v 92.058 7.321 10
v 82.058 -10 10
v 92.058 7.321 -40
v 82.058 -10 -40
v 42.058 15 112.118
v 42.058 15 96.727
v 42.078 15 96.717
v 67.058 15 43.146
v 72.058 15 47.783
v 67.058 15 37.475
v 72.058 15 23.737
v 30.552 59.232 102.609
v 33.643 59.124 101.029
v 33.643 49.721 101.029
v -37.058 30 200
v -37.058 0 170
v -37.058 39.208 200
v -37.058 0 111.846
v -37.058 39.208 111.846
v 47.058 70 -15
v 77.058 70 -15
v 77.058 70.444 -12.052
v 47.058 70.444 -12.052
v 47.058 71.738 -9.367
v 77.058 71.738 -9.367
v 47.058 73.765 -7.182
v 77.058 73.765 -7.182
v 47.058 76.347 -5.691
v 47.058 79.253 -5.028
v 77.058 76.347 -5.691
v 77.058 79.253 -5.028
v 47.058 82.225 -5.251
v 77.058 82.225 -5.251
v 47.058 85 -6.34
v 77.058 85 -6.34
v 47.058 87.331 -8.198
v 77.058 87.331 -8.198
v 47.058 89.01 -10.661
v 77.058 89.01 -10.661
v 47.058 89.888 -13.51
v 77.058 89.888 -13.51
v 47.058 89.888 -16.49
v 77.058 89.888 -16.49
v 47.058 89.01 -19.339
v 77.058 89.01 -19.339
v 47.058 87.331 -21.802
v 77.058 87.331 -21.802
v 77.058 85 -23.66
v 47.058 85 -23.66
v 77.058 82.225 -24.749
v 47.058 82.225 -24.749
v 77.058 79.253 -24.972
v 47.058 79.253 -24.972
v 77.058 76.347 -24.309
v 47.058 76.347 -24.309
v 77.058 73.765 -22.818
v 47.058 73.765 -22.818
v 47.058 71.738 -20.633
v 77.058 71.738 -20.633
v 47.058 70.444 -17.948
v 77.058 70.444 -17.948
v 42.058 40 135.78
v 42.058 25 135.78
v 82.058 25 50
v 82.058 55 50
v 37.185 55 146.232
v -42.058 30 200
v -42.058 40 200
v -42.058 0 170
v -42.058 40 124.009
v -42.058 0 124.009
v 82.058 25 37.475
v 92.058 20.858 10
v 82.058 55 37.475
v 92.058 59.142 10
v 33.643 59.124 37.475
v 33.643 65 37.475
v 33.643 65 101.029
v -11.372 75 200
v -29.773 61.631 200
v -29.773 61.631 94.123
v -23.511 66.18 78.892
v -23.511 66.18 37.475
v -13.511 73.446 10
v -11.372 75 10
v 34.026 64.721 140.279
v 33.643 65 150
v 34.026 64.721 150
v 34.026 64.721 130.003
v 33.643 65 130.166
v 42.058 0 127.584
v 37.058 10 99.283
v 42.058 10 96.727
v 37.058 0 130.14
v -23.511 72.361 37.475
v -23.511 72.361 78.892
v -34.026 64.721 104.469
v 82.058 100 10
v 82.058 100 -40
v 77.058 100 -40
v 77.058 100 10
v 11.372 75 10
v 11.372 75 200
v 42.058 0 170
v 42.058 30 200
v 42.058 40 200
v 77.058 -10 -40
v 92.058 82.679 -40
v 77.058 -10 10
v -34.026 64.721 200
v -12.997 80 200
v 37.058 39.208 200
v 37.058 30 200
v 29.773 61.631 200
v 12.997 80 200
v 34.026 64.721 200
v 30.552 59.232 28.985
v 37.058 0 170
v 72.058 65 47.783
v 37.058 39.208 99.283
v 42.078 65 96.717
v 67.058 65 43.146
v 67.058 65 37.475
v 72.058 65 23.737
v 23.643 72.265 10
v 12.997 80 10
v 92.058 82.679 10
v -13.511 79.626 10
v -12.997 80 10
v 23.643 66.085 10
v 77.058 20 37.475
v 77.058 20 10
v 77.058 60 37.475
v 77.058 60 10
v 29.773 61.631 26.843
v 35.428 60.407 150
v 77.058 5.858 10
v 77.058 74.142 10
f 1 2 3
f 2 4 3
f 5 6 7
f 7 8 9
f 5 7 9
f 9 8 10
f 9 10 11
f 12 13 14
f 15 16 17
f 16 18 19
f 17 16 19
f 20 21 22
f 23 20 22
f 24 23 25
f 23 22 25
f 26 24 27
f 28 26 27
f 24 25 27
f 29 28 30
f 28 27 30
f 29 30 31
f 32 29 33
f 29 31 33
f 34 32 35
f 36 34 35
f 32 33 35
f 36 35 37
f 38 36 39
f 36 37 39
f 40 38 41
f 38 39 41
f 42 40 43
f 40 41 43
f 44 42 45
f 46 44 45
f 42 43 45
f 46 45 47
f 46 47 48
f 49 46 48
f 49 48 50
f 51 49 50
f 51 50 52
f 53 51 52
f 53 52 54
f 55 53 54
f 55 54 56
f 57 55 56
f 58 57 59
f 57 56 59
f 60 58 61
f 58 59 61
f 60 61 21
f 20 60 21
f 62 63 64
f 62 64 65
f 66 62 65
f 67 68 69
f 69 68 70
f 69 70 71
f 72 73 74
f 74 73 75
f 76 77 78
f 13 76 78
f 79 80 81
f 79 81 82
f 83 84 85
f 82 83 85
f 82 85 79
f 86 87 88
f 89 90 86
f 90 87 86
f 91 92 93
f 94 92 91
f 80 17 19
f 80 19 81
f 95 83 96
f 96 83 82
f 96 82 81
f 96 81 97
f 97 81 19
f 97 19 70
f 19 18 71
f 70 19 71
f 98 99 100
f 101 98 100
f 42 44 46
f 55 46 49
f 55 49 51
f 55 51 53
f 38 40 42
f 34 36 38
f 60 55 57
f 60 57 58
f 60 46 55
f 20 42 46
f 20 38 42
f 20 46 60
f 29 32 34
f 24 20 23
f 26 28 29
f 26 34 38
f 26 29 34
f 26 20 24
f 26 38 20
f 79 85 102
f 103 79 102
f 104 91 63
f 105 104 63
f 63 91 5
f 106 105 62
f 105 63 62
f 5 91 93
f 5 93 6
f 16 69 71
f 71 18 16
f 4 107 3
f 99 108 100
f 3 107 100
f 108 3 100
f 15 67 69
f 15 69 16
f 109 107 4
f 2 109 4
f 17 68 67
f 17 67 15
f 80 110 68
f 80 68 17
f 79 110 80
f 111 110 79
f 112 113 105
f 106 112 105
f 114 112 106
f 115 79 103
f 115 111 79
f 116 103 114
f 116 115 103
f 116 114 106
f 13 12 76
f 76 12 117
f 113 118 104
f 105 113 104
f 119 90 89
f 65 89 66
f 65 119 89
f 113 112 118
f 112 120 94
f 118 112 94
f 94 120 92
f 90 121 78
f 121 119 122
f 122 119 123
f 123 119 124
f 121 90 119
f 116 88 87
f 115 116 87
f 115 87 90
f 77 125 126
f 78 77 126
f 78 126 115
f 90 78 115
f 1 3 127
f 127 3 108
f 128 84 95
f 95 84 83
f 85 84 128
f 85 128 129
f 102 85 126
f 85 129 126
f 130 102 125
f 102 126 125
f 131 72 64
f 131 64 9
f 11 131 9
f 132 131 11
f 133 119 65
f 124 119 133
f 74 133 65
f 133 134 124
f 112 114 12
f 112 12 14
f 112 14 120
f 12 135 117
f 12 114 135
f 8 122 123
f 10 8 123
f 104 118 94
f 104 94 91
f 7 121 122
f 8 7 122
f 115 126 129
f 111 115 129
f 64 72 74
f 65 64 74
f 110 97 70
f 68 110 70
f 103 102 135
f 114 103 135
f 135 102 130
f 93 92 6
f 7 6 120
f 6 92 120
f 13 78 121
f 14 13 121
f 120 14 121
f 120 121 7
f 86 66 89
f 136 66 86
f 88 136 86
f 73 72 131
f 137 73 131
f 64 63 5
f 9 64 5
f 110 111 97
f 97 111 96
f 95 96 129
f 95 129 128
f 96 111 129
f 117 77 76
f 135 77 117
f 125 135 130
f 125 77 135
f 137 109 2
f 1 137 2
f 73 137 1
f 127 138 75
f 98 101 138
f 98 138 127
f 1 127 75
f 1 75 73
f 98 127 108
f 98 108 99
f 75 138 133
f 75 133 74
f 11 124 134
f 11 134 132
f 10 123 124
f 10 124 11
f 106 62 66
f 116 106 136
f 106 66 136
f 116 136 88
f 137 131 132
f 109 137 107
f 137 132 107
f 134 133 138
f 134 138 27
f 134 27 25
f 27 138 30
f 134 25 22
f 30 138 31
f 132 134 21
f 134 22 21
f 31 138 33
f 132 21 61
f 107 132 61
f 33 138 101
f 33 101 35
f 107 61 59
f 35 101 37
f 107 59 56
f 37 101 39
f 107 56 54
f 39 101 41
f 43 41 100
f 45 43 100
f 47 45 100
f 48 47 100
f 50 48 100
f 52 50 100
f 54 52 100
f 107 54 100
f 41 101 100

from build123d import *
from OCP.BRepFilletAPI import BRepFilletAPI_MakeChamfer

# Parameters (mm, degrees)
BOSS_EXTRU_1_DEPTH      = 200
BOSS_EXTRU_2_DEPTH      = 50
BOSS_EXTRU_2_DEPTH_BACK = 90
ESQUISSE3_W             = 40
ESQUISSE3_H             = 110
BOSS_EXTRU_3_DEPTH      = 150
CHANFREIN1_SIZE         = 10
CHANFREIN1_SIZE2        = 17.320508076
CHANFREIN2_SIZE         = 100
CHANFREIN2_SIZE2        = 46.630765816
CHANFREIN3_SIZE         = 10
CHANFREIN4_SIZE         = 30
BOSS_EXTRU_4_DEPTH      = 10
ENL_V_MAT_EXTRU_1_DEPTH = 130
ESQUISSE7_R             = 10
BOSS_EXTRU_5_DEPTH      = 30
CHANFREIN5_SIZE         = 27.474774195
CHANFREIN5_SIZE_2       = 10
ENL_V_MAT_EXTRU_2_DEPTH = 130
CHANFREIN6_SIZE         = 10
CHANFREIN6_SIZE_2       = 27.474774195
CHANFREIN6_SIZE_3       = 9.402654051


# Some blends are built 0.0001 mm under size
with BuildPart() as part:
    # Esquisse1 → Boss.-Extru.1 (new body)
    with BuildSketch(Plane.XY):
        Polygon((-42.05848897, 40), (-42.05848897, 0), (-37.05848897, 0), (-37.05848897, 5), (-37.05848897, 39.208077798), (-29.772778292, 61.631189606), (-11.372189368, 75), (11.372189368, 75), (29.772778292, 61.631189606), (37.05848897, 39.208077798), (37.05848897, 5), (37.05848897, 0), (42.05848897, 0), (42.05848897, 40), (34.026032334, 64.72135955), (12.996787849, 80), (-12.996787849, 80), (-34.026032334, 64.72135955), align=None)
    extrude(amount=BOSS_EXTRU_1_DEPTH)

    # Esquisse3 → Boss.-Extru.2 (add, two sides: drawn at the far end of the back side and taken through both)
    with BuildSketch(Plane(origin=(42.05848897, 0, 0), x_dir=(0, 0, -1), z_dir=(1, 0, 0)).offset(-BOSS_EXTRU_2_DEPTH_BACK)):
        with Locations((20, 45)):
            Rectangle(ESQUISSE3_W, ESQUISSE3_H)
    extrude(amount=BOSS_EXTRU_2_DEPTH + BOSS_EXTRU_2_DEPTH_BACK)

    # Esquisse4 → Boss.-Extru.3 (add)
    with BuildSketch(Plane.XY):
        Polygon((42.05848897, 40), (42.05848897, 15), (82.05848897, 15), (82.05848897, 65), (33.642516656, 65), (34.026032334, 64.72135955), align=None)
    extrude(amount=BOSS_EXTRU_3_DEPTH)

    # Chanfrein1: one chamfer whose edges measure the first distance from different faces: ONE call of the kernel's chamfer builder (chamfer() names one face for all edges)
    chanfrein1_edges_1 = [part.edges().sort_by_distance(p)[0] for p in [
        (92.05848897, -10, -20),
    ]]
    chanfrein1_side_1 = [part.faces().sort_by_distance(p)[0] for p in [
        (22.05848897, -10, -20),
    ]]
    chanfrein1_edges_2 = [part.edges().sort_by_distance(p)[0] for p in [
        (92.05848897, 100, -20),
    ]]
    chanfrein1_side_2 = [part.faces().sort_by_distance(p)[0] for p in [
        (22.05848897, 100, -20),
    ]]
    chanfrein1 = BRepFilletAPI_MakeChamfer(part.part.solid().wrapped)
    for e in chanfrein1_edges_1:
        chanfrein1.Add(CHANFREIN1_SIZE, CHANFREIN1_SIZE2, e.wrapped, chanfrein1_side_1[0].wrapped)  # the first distance lies on this face
    for e in chanfrein1_edges_2:
        chanfrein1.Add(CHANFREIN1_SIZE, CHANFREIN1_SIZE2, e.wrapped, chanfrein1_side_2[0].wrapped)  # the first distance lies on this face
    add(Compound.cast(chanfrein1.Shape()), mode=Mode.REPLACE)

    # Chanfrein2
    chanfrein2_edges = [part.edges().sort_by_distance(p)[0] for p in [
        (82.05848897, 40, 150),
    ]]
    chanfrein2_side = [part.faces().sort_by_distance(p)[0] for p in [
        (82.05848897, 40, 75),
    ]]
    chamfer(chanfrein2_edges, length=CHANFREIN2_SIZE, length2=CHANFREIN2_SIZE2, reference=chanfrein2_side[0])

    # Chanfrein3
    # the kernel refuses this chamfer: 10 mm, written as the material it takes off along each edge
    with BuildSketch(Plane(origin=(92.926890911, 15, 26.692636822), x_dir=(0.02491972708357348, 0.9996219169112968, 0.011620259578202877), z_dir=(-0.4226182617407005, 0, 0.9063077870366495))) as chanfrein3_piece_1_section:
        Polygon((CHANFREIN3_SIZE * 0.999621916911, CHANFREIN3_SIZE * 0.0274958766106), (-CHANFREIN3_SIZE * 0.0274958766106, CHANFREIN3_SIZE * 0.999621916911), (0, 0), align=None)
    chanfrein3_piece_1 = extrude(amount=146.081723085, mode=Mode.PRIVATE)
    chanfrein3_piece_1 = split(chanfrein3_piece_1, bisect_by=Plane(origin=(42.05848897, 18.333333333, 85.0027998), z_dir=(1, 0, 0)), keep=Keep.TOP, mode=Mode.PRIVATE)
    add(chanfrein3_piece_1, mode=Mode.SUBTRACT)
    with BuildSketch(Plane(origin=(82.05848897, 15, 0), x_dir=(0.027495876610586334, 0.9996219169112968, 0), z_dir=(0, 0, 1)), Plane(origin=(82.05848897, 65, 0), x_dir=(-0.9996219169112968, 0.027495876610586317, 0), z_dir=(0, 0, 1))) as chanfrein3_piece_2:
        Polygon((CHANFREIN3_SIZE * 0.999621916911, CHANFREIN3_SIZE * 0.0274958766106), (-CHANFREIN3_SIZE * 0.0274958766106, CHANFREIN3_SIZE * 0.999621916911), (0, 0), align=None)
    extrude(amount=75.71682988, mode=Mode.SUBTRACT)
    with BuildSketch(Plane(origin=(61.144553034, 65, 150), x_dir=(0, 0.027495876610586282, -0.9996219169112968), z_dir=(-1, 0, 0))) as chanfrein3_piece_3_section:
        Polygon((CHANFREIN3_SIZE * 0.999621916911, CHANFREIN3_SIZE * 0.0274958766106), (-CHANFREIN3_SIZE * 0.0274958766106, CHANFREIN3_SIZE * 0.999621916911), (0, 0), align=None)
    chanfrein3_piece_3 = extrude(amount=53.218866257, mode=Mode.PRIVATE)
    chanfrein3_piece_3 = split(chanfrein3_piece_3, bisect_by=Plane(origin=(34.447587874, 63.423945004, 144.130905286), z_dir=(0.9510565162951539, 0.3090169943749468, 0)), keep=Keep.TOP, mode=Mode.PRIVATE)
    add(chanfrein3_piece_3, mode=Mode.SUBTRACT)
    with BuildSketch(Plane(origin=(61.144553034, 65, 150), x_dir=(0, 0.027495876610586282, -0.9996219169112968), z_dir=(-1, 0, 0))) as chanfrein3_piece_4_section:
        Polygon((CHANFREIN3_SIZE * 0.999621916911, CHANFREIN3_SIZE * 0.0274958766106), (-CHANFREIN3_SIZE * 0.0274958766106, CHANFREIN3_SIZE * 0.999621916911), (0, 0), align=None)
    chanfrein3_piece_4 = extrude(amount=53.218866257, mode=Mode.PRIVATE)
    chanfrein3_piece_4 = split(chanfrein3_piece_4, bisect_by=Plane(origin=(33.833825058, 64.86100631, 145.046222385), z_dir=(0.5877852522924745, 0.8090169943749465, 0)), keep=Keep.TOP, mode=Mode.PRIVATE)
    add(chanfrein3_piece_4, mode=Mode.SUBTRACT)
    with BuildSketch(Plane(origin=(92.926890911, 65, 26.692636822), x_dir=(-0.9059651273892109, 0.027495876610586337, -0.4224584769229591), z_dir=(-0.4226182617407005, 0, 0.9063077870366495))) as chanfrein3_piece_5_section:
        Polygon((CHANFREIN3_SIZE * 0.999621916911, CHANFREIN3_SIZE * 0.0274958766106), (-CHANFREIN3_SIZE * 0.0274958766106, CHANFREIN3_SIZE * 0.999621916911), (0, 0), align=None)
    chanfrein3_piece_5 = extrude(amount=161.771451656, mode=Mode.PRIVATE)
    chanfrein3_piece_5 = split(chanfrein3_piece_5, bisect_by=Plane(origin=(37.356602315, 54.470919151, 89.132837903), z_dir=(0.9510565162951539, 0.3090169943749468, 0)), keep=Keep.TOP, mode=Mode.PRIVATE)
    add(chanfrein3_piece_5, mode=Mode.SUBTRACT)
    with BuildSketch(Plane(origin=(92.926890911, 65, 26.692636822), x_dir=(-0.9059651273892109, 0.027495876610586337, -0.4224584769229591), z_dir=(-0.4226182617407005, 0, 0.9063077870366495))) as chanfrein3_piece_6_section:
        Polygon((CHANFREIN3_SIZE * 0.999621916911, CHANFREIN3_SIZE * 0.0274958766106), (-CHANFREIN3_SIZE * 0.0274958766106, CHANFREIN3_SIZE * 0.999621916911), (0, 0), align=None)
    chanfrein3_piece_6 = extrude(amount=161.771451656, mode=Mode.PRIVATE)
    chanfrein3_piece_6 = split(chanfrein3_piece_6, bisect_by=Plane(origin=(33.834404205, 64.860585536, 139.950840197), z_dir=(0.5877852522924745, 0.8090169943749465, 0)), keep=Keep.TOP, mode=Mode.PRIVATE)
    add(chanfrein3_piece_6, mode=Mode.SUBTRACT)

    # Chanfrein4
    chanfrein4_edges = [part.edges().sort_by_distance(p)[0] for p in [
        (-39.55848897, 0, 200),
        (39.55848897, 0, 200),
    ]]
    chamfer(chanfrein4_edges, length=CHANFREIN4_SIZE)

    # Esquisse6 → Boss.-Extru.4 (add)
    with BuildSketch(Plane.XY):
        Polygon((-47.94151103, -10), (82.05848897, -10), (92.05848897, 7.320508076), (92.05848897, 82.679491924), (82.05848897, 100), (-47.94151103, 100), align=None)
    extrude(amount=BOSS_EXTRU_4_DEPTH)

    # Esquisse5 → Enlèv. mat.-Extru.1 (cut)
    with BuildSketch(Plane(origin=(0, 100, 0), x_dir=(1, 0, 0), z_dir=(0, 1, 0))):
        Polygon((77.05848897, -10), (77.05848897, 40), (-47.94151103, 40), (-47.94151103, -10), (33.642516656, -10), (67.05848897, -10), align=None)
        Polygon((67.05848897, -43.145928791), (67.05848897, -10), (33.642516656, -10), (33.642516656, -101.029300724), (42.077832628, -96.717119194), align=None)
    extrude(amount=-ENL_V_MAT_EXTRU_1_DEPTH, mode=Mode.SUBTRACT)

    # Esquisse7 → Boss.-Extru.5 (add)
    with BuildSketch(Plane.ZY.offset(-77.05848897)):
        with Locations(Location((-15, 80, 0), (0, 0, 270))):
            Circle(ESQUISSE7_R)
    extrude(amount=BOSS_EXTRU_5_DEPTH)

    # Chanfrein5
    chanfrein5_edges_1 = [part.edges().sort_by_distance(p)[0] for p in [
        (79.55848897, 22.5, 10),
    ]]
    chanfrein5_side_1 = [part.faces().sort_by_distance(p)[0] for p in [
        (79.55848897, 22.5, 10.2),
    ]]
    chanfrein5_edges_2 = [part.edges().sort_by_distance(p)[0] for p in [
        (82.05848897, 40, 10),
    ]]
    chanfrein5_side_2 = [part.faces().sort_by_distance(p)[0] for p in [
        (82.05848897, 40, 10.2),
    ]]
    chanfrein5_edges_3 = [part.edges().sort_by_distance(p)[0] for p in [
        (79.55848897, 57.5, 10),
    ]]
    chanfrein5_side_3 = [part.faces().sort_by_distance(p)[0] for p in [
        (79.55848897, 57.5, 10.2),
    ]]
    chanfrein5_edges_4 = [part.edges().sort_by_distance(p)[0] for p in [
        (67.05848897, 40, 10),
    ]]
    chanfrein5_side_4 = [part.faces().sort_by_distance(p)[0] for p in [
        (67.25848897, 40, 10),
    ]]
    chanfrein5 = BRepFilletAPI_MakeChamfer(part.part.solid().wrapped)
    for e in chanfrein5_edges_1:
        chanfrein5.Add(CHANFREIN5_SIZE - 0.0001, CHANFREIN5_SIZE_2 - 0.0001, e.wrapped, chanfrein5_side_1[0].wrapped)
    for e in chanfrein5_edges_2:
        chanfrein5.Add(CHANFREIN5_SIZE - 0.0001, CHANFREIN5_SIZE_2 - 0.0001, e.wrapped, chanfrein5_side_2[0].wrapped)
    for e in chanfrein5_edges_3:
        chanfrein5.Add(CHANFREIN5_SIZE - 0.0001, CHANFREIN5_SIZE_2 - 0.0001, e.wrapped, chanfrein5_side_3[0].wrapped)
    for e in chanfrein5_edges_4:
        chanfrein5.Add(CHANFREIN5_SIZE_2 - 0.0001, CHANFREIN5_SIZE - 0.0001, e.wrapped, chanfrein5_side_4[0].wrapped)
    add(Compound.cast(chanfrein5.Shape()), mode=Mode.REPLACE)  # a hair under: the kernel refuses the full size

    # Esquisse8 → Enlèv. mat.-Extru.2 (cut)
    with BuildSketch(Plane(origin=(0, 0, 0), x_dir=(1, 0, 0), z_dir=(0, 1, 0))):
        Polygon((-23.511410092, -10), (-23.511410092, -78.891987617), (-42.05848897, -124.008670609), (-42.05848897, -10), align=None)
    extrude(amount=ENL_V_MAT_EXTRU_2_DEPTH, mode=Mode.SUBTRACT)

    # Chanfrein6
    # the kernel refuses this chamfer: 27.474774195, 10, 9.402654051 mm, written as the material it takes off along each edge
    with BuildSketch(Plane(origin=(-23.511410092, -5.094574606, 10), x_dir=(0.9950833631817486, 0, -0.09904090225205081), z_dir=(0, 1, 0))) as chanfrein6_piece_1:
        Polygon((CHANFREIN6_SIZE * 0.995083363182, -CHANFREIN6_SIZE * 0.0990409022521), (-CHANFREIN6_SIZE_2 * 0.0990409022504, -CHANFREIN6_SIZE_2 * 0.995083363165), (0, 0), align=None)
    extrude(amount=148.730168875, mode=Mode.SUBTRACT)
    with BuildSketch(Plane(origin=(33.642516656, 136.274914494, 10), x_dir=(0.01318405819864584, 0, 0.9999130865277315), z_dir=(0, -1, 0))) as chanfrein6_piece_2:
        Polygon((CHANFREIN6_SIZE_2 * 0.999913086511, CHANFREIN6_SIZE_2 * 0.0131840581984), (-CHANFREIN6_SIZE * 0.0131840581986, CHANFREIN6_SIZE * 0.999913086528), (0, 0), align=None)
    extrude(amount=157.828469437, mode=Mode.SUBTRACT)
    with BuildSketch(Plane(origin=(-26.404734257, 0, 131.72579712), x_dir=(-0.04508122292734055, 0.9950833631817486, -0.08818607406090614), z_dir=(0.8904005522534487, -1.452228809103749e-15, -0.455177829586145))) as chanfrein6_piece_3:
        Polygon((CHANFREIN6_SIZE * 0.995083363182, CHANFREIN6_SIZE * 0.0990409022521), (-CHANFREIN6_SIZE_2 * 0.0990409022504, CHANFREIN6_SIZE_2 * 0.995083363165), (0, 0), align=None)
    extrude(amount=148.165279233, mode=Mode.SUBTRACT)
    # the kernel refuses this chamfer: 27.474774195, 10, 9.402654051 mm, written as the material it takes off along each edge
    with BuildSketch(Plane(origin=(33.642516656, 49.72135955, 12.11533794), x_dir=(-0.34404612147903313, 0.9389527497671193, 0), z_dir=(0, 0, 1))) as chanfrein6_2_piece_1_section:
        Polygon((CHANFREIN6_SIZE * 0.999313229545, -CHANFREIN6_SIZE * 0.0370549491456), (CHANFREIN6_SIZE_3 * 0.938952749733, -CHANFREIN6_SIZE_3 * 0.344046121466), (0, 0), align=None)
    chanfrein6_2_piece_1 = extrude(amount=114.273399039, mode=Mode.PRIVATE)
    chanfrein6_2_piece_1 = split(chanfrein6_2_piece_1, bisect_by=Plane(origin=(50.743372859, 55.917594233, 92.287245712), z_dir=(-0.455177829586145, 0, -0.8904005522534487)), keep=Keep.TOP, mode=Mode.PRIVATE)
    add(chanfrein6_2_piece_1, mode=Mode.SUBTRACT)


solid = part.part
